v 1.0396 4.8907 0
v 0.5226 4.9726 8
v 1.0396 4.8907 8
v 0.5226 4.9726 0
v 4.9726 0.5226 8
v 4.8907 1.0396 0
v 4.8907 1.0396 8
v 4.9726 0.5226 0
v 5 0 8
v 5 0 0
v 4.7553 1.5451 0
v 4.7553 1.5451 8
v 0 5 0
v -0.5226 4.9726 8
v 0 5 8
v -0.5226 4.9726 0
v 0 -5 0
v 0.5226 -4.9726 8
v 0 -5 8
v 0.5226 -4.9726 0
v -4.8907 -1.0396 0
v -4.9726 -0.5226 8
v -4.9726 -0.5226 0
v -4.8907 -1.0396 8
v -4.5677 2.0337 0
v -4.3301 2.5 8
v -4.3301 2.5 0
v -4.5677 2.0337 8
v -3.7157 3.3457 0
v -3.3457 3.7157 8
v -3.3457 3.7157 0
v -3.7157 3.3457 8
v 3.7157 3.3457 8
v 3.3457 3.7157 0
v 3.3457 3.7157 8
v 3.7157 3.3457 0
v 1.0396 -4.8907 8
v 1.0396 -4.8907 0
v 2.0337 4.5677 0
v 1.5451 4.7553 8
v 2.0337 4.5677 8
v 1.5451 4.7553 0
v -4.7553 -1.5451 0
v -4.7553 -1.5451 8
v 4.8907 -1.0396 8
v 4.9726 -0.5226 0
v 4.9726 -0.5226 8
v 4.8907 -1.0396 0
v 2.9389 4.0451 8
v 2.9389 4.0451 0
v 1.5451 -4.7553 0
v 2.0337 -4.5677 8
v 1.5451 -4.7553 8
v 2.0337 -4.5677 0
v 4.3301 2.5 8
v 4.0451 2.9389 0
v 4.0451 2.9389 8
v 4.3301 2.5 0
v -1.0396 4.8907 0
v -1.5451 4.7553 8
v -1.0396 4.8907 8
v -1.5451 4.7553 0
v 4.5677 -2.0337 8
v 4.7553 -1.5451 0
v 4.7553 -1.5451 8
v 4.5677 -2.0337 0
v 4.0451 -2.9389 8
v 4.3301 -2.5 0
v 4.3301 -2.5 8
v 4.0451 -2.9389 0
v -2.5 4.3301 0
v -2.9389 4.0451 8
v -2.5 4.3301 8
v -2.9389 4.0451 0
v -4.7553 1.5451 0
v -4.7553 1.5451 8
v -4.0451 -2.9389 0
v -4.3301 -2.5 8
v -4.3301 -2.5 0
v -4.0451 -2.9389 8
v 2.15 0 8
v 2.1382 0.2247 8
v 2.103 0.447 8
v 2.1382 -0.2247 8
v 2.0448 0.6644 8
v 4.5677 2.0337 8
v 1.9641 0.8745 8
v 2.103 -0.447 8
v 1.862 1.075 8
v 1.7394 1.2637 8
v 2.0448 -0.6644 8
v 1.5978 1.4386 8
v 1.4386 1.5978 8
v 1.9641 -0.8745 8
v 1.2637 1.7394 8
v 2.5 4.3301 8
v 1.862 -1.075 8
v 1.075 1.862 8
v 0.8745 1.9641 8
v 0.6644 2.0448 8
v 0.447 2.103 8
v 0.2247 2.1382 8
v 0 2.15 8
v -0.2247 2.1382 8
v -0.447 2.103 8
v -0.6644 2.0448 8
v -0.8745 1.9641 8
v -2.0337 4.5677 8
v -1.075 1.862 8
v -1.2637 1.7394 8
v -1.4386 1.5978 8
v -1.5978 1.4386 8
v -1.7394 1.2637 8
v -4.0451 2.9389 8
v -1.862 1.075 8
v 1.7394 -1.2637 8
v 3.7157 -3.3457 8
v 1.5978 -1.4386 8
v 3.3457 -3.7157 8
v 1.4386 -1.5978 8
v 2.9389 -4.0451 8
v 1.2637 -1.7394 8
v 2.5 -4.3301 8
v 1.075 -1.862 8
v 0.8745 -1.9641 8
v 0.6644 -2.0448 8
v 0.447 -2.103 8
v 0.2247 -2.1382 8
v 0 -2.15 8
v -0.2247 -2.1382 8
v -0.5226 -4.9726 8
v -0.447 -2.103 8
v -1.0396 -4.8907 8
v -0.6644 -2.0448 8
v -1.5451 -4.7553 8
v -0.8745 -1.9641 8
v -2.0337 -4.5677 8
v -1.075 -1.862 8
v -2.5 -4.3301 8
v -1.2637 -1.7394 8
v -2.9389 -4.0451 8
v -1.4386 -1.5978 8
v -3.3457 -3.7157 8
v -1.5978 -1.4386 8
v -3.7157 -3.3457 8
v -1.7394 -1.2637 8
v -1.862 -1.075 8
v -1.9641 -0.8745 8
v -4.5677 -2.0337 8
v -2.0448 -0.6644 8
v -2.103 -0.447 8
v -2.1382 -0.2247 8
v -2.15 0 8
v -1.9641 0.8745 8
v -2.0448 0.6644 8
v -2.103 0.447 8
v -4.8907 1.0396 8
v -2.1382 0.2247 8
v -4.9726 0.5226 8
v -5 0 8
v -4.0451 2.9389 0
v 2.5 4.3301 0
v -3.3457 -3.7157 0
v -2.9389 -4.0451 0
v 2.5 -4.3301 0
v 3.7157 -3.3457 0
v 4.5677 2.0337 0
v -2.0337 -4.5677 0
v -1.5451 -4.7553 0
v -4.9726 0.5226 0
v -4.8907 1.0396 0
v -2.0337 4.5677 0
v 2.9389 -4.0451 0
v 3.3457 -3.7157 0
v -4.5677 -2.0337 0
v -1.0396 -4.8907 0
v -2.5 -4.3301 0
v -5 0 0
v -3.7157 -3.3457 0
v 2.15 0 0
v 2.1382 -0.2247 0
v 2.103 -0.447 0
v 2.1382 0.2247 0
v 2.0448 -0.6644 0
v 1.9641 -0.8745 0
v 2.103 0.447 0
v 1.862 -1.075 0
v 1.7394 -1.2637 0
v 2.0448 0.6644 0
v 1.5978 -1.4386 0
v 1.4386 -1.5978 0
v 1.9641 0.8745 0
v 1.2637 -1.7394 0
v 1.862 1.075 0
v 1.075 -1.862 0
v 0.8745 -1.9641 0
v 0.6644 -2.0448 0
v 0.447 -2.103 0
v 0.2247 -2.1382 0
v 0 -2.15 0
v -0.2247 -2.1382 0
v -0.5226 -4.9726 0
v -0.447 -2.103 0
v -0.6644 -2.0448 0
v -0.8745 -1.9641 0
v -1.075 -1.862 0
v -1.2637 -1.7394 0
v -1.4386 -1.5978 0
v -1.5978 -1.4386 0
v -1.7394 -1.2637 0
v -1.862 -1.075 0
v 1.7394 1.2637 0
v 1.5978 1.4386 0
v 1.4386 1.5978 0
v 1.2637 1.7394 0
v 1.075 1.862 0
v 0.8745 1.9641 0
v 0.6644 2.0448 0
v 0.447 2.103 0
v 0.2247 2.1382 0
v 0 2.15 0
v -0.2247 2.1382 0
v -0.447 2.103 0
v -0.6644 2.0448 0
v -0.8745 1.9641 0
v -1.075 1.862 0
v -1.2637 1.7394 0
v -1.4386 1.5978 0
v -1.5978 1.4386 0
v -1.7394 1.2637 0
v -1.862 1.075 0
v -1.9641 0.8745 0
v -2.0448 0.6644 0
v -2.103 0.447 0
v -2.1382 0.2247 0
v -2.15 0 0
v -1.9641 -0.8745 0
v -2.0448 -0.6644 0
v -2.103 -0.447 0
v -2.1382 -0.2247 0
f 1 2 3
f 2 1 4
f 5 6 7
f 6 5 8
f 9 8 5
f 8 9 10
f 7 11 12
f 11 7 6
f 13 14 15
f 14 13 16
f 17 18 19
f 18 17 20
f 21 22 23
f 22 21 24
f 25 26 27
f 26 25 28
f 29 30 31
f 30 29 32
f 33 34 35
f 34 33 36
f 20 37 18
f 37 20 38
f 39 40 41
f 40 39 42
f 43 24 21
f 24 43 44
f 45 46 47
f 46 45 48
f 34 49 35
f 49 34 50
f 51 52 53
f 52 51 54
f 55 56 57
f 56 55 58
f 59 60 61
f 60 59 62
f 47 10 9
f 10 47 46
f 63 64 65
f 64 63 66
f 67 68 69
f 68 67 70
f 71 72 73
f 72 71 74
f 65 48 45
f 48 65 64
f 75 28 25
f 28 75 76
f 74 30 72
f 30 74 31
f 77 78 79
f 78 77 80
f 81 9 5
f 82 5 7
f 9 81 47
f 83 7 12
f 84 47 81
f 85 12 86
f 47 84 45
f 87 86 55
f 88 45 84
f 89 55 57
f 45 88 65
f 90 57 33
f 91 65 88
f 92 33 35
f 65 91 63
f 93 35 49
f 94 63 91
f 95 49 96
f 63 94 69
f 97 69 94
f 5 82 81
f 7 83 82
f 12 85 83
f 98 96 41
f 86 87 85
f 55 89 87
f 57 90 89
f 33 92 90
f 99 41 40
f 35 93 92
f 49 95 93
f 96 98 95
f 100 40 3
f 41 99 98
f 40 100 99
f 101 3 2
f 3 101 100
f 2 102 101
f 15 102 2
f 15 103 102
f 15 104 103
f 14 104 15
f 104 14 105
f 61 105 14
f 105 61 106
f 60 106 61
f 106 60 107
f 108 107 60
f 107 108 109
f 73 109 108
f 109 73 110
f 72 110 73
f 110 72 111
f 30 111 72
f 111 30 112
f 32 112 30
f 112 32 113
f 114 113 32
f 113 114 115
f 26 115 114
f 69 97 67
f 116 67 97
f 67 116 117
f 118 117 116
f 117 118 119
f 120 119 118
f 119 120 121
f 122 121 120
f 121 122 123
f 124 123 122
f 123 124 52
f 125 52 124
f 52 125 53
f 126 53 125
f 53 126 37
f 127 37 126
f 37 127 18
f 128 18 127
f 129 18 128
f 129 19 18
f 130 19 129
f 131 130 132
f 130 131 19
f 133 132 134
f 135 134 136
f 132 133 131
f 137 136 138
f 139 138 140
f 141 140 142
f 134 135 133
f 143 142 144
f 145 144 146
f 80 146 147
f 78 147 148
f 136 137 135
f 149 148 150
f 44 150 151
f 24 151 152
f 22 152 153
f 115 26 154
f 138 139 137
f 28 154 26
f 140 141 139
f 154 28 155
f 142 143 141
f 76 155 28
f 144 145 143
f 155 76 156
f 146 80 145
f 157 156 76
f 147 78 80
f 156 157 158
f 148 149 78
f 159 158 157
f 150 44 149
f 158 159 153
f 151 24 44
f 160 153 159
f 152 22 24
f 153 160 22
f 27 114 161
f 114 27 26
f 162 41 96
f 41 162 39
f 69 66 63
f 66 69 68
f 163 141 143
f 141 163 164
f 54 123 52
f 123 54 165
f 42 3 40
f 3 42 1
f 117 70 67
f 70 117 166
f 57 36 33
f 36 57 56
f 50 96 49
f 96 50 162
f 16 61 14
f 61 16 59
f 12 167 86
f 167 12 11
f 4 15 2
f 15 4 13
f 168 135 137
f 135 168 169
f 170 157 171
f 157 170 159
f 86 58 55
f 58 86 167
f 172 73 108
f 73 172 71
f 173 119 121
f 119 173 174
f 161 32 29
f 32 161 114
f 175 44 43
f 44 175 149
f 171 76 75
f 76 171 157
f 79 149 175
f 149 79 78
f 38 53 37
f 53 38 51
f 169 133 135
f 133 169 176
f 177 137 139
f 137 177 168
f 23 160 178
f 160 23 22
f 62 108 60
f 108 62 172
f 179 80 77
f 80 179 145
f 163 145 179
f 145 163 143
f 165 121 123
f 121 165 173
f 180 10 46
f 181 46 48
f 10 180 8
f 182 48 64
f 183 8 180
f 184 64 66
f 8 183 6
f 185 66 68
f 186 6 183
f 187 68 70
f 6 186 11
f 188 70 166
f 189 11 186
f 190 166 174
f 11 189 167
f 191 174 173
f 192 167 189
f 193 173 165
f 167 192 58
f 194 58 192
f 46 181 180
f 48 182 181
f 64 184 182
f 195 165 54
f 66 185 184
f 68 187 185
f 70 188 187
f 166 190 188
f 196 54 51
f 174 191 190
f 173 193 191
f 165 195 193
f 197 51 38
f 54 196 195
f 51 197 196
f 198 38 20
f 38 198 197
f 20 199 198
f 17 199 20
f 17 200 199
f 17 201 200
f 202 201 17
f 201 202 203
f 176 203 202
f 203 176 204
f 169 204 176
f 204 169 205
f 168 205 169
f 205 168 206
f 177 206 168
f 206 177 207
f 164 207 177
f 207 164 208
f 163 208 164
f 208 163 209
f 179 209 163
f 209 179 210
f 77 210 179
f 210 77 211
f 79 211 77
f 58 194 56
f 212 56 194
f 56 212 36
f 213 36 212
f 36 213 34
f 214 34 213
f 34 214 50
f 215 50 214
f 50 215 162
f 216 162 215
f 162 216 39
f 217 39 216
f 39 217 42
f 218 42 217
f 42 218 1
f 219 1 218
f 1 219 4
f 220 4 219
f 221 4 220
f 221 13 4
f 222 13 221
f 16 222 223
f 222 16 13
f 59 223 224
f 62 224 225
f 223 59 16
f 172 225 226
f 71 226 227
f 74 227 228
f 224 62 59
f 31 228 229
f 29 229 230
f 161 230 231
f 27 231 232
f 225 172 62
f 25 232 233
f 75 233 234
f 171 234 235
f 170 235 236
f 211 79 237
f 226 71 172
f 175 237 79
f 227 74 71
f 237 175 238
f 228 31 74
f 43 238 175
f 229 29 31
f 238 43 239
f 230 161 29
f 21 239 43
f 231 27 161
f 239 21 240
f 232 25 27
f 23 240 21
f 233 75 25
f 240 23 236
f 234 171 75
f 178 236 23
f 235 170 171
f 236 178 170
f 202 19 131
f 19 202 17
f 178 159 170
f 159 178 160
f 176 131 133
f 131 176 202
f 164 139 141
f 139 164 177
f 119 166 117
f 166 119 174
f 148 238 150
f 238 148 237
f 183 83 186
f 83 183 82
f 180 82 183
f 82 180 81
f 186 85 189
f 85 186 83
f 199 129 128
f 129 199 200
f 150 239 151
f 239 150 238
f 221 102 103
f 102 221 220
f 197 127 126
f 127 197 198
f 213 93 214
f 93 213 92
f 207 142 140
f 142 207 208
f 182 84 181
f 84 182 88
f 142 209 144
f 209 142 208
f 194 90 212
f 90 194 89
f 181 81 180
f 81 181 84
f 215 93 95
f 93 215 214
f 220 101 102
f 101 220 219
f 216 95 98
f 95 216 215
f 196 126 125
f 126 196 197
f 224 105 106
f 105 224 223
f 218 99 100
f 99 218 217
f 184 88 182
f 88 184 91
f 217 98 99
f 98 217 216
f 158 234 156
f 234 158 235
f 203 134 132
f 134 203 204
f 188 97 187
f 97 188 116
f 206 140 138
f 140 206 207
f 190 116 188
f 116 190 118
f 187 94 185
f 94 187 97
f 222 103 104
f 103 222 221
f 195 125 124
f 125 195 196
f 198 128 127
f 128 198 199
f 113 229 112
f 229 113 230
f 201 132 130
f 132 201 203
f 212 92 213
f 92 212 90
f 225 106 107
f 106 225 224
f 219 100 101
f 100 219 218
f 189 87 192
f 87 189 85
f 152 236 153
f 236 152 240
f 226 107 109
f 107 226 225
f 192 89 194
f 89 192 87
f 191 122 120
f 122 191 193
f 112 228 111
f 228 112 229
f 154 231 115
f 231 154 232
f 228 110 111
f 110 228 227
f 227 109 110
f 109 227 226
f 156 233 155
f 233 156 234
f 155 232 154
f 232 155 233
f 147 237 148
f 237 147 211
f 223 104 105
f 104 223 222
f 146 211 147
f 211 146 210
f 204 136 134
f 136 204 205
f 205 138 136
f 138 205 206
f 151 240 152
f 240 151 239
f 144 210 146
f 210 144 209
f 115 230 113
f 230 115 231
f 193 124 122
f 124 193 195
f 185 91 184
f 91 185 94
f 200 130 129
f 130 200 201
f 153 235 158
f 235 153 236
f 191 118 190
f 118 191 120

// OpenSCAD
// Round spacer.
$fn = 60;
eps = 0.02;
inner_d = 4.3;
outer_d = 10;
length = 8;
difference() { cylinder(d=outer_d,h=length); translate([0,0,-eps]) cylinder(d=inner_d,h=length+2*eps); }
